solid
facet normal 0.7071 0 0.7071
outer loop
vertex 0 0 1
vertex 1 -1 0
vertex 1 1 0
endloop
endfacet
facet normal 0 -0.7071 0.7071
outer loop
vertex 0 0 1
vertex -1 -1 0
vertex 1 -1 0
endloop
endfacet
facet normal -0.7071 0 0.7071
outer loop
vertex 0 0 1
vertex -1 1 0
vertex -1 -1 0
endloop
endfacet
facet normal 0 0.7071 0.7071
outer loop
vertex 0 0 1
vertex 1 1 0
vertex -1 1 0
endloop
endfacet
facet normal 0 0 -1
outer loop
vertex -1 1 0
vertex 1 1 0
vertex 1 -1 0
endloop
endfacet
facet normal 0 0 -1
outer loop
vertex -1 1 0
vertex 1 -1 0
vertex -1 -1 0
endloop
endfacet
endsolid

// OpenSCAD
$fn=64;

polyhedron(
  points=[ [1,1,0],[1,-1,0],[-1,-1,0],[-1,1,0], // the four points at base
           [0,0,1]  ],                                 // the apex point 
  faces=[ [0,1,4],[1,2,4],[2,3,4],[3,0,4],              // each triangle side
              [1,0,3],[2,1,3] ]                         // two triangles for square base
 );
  
    polyhedron();
